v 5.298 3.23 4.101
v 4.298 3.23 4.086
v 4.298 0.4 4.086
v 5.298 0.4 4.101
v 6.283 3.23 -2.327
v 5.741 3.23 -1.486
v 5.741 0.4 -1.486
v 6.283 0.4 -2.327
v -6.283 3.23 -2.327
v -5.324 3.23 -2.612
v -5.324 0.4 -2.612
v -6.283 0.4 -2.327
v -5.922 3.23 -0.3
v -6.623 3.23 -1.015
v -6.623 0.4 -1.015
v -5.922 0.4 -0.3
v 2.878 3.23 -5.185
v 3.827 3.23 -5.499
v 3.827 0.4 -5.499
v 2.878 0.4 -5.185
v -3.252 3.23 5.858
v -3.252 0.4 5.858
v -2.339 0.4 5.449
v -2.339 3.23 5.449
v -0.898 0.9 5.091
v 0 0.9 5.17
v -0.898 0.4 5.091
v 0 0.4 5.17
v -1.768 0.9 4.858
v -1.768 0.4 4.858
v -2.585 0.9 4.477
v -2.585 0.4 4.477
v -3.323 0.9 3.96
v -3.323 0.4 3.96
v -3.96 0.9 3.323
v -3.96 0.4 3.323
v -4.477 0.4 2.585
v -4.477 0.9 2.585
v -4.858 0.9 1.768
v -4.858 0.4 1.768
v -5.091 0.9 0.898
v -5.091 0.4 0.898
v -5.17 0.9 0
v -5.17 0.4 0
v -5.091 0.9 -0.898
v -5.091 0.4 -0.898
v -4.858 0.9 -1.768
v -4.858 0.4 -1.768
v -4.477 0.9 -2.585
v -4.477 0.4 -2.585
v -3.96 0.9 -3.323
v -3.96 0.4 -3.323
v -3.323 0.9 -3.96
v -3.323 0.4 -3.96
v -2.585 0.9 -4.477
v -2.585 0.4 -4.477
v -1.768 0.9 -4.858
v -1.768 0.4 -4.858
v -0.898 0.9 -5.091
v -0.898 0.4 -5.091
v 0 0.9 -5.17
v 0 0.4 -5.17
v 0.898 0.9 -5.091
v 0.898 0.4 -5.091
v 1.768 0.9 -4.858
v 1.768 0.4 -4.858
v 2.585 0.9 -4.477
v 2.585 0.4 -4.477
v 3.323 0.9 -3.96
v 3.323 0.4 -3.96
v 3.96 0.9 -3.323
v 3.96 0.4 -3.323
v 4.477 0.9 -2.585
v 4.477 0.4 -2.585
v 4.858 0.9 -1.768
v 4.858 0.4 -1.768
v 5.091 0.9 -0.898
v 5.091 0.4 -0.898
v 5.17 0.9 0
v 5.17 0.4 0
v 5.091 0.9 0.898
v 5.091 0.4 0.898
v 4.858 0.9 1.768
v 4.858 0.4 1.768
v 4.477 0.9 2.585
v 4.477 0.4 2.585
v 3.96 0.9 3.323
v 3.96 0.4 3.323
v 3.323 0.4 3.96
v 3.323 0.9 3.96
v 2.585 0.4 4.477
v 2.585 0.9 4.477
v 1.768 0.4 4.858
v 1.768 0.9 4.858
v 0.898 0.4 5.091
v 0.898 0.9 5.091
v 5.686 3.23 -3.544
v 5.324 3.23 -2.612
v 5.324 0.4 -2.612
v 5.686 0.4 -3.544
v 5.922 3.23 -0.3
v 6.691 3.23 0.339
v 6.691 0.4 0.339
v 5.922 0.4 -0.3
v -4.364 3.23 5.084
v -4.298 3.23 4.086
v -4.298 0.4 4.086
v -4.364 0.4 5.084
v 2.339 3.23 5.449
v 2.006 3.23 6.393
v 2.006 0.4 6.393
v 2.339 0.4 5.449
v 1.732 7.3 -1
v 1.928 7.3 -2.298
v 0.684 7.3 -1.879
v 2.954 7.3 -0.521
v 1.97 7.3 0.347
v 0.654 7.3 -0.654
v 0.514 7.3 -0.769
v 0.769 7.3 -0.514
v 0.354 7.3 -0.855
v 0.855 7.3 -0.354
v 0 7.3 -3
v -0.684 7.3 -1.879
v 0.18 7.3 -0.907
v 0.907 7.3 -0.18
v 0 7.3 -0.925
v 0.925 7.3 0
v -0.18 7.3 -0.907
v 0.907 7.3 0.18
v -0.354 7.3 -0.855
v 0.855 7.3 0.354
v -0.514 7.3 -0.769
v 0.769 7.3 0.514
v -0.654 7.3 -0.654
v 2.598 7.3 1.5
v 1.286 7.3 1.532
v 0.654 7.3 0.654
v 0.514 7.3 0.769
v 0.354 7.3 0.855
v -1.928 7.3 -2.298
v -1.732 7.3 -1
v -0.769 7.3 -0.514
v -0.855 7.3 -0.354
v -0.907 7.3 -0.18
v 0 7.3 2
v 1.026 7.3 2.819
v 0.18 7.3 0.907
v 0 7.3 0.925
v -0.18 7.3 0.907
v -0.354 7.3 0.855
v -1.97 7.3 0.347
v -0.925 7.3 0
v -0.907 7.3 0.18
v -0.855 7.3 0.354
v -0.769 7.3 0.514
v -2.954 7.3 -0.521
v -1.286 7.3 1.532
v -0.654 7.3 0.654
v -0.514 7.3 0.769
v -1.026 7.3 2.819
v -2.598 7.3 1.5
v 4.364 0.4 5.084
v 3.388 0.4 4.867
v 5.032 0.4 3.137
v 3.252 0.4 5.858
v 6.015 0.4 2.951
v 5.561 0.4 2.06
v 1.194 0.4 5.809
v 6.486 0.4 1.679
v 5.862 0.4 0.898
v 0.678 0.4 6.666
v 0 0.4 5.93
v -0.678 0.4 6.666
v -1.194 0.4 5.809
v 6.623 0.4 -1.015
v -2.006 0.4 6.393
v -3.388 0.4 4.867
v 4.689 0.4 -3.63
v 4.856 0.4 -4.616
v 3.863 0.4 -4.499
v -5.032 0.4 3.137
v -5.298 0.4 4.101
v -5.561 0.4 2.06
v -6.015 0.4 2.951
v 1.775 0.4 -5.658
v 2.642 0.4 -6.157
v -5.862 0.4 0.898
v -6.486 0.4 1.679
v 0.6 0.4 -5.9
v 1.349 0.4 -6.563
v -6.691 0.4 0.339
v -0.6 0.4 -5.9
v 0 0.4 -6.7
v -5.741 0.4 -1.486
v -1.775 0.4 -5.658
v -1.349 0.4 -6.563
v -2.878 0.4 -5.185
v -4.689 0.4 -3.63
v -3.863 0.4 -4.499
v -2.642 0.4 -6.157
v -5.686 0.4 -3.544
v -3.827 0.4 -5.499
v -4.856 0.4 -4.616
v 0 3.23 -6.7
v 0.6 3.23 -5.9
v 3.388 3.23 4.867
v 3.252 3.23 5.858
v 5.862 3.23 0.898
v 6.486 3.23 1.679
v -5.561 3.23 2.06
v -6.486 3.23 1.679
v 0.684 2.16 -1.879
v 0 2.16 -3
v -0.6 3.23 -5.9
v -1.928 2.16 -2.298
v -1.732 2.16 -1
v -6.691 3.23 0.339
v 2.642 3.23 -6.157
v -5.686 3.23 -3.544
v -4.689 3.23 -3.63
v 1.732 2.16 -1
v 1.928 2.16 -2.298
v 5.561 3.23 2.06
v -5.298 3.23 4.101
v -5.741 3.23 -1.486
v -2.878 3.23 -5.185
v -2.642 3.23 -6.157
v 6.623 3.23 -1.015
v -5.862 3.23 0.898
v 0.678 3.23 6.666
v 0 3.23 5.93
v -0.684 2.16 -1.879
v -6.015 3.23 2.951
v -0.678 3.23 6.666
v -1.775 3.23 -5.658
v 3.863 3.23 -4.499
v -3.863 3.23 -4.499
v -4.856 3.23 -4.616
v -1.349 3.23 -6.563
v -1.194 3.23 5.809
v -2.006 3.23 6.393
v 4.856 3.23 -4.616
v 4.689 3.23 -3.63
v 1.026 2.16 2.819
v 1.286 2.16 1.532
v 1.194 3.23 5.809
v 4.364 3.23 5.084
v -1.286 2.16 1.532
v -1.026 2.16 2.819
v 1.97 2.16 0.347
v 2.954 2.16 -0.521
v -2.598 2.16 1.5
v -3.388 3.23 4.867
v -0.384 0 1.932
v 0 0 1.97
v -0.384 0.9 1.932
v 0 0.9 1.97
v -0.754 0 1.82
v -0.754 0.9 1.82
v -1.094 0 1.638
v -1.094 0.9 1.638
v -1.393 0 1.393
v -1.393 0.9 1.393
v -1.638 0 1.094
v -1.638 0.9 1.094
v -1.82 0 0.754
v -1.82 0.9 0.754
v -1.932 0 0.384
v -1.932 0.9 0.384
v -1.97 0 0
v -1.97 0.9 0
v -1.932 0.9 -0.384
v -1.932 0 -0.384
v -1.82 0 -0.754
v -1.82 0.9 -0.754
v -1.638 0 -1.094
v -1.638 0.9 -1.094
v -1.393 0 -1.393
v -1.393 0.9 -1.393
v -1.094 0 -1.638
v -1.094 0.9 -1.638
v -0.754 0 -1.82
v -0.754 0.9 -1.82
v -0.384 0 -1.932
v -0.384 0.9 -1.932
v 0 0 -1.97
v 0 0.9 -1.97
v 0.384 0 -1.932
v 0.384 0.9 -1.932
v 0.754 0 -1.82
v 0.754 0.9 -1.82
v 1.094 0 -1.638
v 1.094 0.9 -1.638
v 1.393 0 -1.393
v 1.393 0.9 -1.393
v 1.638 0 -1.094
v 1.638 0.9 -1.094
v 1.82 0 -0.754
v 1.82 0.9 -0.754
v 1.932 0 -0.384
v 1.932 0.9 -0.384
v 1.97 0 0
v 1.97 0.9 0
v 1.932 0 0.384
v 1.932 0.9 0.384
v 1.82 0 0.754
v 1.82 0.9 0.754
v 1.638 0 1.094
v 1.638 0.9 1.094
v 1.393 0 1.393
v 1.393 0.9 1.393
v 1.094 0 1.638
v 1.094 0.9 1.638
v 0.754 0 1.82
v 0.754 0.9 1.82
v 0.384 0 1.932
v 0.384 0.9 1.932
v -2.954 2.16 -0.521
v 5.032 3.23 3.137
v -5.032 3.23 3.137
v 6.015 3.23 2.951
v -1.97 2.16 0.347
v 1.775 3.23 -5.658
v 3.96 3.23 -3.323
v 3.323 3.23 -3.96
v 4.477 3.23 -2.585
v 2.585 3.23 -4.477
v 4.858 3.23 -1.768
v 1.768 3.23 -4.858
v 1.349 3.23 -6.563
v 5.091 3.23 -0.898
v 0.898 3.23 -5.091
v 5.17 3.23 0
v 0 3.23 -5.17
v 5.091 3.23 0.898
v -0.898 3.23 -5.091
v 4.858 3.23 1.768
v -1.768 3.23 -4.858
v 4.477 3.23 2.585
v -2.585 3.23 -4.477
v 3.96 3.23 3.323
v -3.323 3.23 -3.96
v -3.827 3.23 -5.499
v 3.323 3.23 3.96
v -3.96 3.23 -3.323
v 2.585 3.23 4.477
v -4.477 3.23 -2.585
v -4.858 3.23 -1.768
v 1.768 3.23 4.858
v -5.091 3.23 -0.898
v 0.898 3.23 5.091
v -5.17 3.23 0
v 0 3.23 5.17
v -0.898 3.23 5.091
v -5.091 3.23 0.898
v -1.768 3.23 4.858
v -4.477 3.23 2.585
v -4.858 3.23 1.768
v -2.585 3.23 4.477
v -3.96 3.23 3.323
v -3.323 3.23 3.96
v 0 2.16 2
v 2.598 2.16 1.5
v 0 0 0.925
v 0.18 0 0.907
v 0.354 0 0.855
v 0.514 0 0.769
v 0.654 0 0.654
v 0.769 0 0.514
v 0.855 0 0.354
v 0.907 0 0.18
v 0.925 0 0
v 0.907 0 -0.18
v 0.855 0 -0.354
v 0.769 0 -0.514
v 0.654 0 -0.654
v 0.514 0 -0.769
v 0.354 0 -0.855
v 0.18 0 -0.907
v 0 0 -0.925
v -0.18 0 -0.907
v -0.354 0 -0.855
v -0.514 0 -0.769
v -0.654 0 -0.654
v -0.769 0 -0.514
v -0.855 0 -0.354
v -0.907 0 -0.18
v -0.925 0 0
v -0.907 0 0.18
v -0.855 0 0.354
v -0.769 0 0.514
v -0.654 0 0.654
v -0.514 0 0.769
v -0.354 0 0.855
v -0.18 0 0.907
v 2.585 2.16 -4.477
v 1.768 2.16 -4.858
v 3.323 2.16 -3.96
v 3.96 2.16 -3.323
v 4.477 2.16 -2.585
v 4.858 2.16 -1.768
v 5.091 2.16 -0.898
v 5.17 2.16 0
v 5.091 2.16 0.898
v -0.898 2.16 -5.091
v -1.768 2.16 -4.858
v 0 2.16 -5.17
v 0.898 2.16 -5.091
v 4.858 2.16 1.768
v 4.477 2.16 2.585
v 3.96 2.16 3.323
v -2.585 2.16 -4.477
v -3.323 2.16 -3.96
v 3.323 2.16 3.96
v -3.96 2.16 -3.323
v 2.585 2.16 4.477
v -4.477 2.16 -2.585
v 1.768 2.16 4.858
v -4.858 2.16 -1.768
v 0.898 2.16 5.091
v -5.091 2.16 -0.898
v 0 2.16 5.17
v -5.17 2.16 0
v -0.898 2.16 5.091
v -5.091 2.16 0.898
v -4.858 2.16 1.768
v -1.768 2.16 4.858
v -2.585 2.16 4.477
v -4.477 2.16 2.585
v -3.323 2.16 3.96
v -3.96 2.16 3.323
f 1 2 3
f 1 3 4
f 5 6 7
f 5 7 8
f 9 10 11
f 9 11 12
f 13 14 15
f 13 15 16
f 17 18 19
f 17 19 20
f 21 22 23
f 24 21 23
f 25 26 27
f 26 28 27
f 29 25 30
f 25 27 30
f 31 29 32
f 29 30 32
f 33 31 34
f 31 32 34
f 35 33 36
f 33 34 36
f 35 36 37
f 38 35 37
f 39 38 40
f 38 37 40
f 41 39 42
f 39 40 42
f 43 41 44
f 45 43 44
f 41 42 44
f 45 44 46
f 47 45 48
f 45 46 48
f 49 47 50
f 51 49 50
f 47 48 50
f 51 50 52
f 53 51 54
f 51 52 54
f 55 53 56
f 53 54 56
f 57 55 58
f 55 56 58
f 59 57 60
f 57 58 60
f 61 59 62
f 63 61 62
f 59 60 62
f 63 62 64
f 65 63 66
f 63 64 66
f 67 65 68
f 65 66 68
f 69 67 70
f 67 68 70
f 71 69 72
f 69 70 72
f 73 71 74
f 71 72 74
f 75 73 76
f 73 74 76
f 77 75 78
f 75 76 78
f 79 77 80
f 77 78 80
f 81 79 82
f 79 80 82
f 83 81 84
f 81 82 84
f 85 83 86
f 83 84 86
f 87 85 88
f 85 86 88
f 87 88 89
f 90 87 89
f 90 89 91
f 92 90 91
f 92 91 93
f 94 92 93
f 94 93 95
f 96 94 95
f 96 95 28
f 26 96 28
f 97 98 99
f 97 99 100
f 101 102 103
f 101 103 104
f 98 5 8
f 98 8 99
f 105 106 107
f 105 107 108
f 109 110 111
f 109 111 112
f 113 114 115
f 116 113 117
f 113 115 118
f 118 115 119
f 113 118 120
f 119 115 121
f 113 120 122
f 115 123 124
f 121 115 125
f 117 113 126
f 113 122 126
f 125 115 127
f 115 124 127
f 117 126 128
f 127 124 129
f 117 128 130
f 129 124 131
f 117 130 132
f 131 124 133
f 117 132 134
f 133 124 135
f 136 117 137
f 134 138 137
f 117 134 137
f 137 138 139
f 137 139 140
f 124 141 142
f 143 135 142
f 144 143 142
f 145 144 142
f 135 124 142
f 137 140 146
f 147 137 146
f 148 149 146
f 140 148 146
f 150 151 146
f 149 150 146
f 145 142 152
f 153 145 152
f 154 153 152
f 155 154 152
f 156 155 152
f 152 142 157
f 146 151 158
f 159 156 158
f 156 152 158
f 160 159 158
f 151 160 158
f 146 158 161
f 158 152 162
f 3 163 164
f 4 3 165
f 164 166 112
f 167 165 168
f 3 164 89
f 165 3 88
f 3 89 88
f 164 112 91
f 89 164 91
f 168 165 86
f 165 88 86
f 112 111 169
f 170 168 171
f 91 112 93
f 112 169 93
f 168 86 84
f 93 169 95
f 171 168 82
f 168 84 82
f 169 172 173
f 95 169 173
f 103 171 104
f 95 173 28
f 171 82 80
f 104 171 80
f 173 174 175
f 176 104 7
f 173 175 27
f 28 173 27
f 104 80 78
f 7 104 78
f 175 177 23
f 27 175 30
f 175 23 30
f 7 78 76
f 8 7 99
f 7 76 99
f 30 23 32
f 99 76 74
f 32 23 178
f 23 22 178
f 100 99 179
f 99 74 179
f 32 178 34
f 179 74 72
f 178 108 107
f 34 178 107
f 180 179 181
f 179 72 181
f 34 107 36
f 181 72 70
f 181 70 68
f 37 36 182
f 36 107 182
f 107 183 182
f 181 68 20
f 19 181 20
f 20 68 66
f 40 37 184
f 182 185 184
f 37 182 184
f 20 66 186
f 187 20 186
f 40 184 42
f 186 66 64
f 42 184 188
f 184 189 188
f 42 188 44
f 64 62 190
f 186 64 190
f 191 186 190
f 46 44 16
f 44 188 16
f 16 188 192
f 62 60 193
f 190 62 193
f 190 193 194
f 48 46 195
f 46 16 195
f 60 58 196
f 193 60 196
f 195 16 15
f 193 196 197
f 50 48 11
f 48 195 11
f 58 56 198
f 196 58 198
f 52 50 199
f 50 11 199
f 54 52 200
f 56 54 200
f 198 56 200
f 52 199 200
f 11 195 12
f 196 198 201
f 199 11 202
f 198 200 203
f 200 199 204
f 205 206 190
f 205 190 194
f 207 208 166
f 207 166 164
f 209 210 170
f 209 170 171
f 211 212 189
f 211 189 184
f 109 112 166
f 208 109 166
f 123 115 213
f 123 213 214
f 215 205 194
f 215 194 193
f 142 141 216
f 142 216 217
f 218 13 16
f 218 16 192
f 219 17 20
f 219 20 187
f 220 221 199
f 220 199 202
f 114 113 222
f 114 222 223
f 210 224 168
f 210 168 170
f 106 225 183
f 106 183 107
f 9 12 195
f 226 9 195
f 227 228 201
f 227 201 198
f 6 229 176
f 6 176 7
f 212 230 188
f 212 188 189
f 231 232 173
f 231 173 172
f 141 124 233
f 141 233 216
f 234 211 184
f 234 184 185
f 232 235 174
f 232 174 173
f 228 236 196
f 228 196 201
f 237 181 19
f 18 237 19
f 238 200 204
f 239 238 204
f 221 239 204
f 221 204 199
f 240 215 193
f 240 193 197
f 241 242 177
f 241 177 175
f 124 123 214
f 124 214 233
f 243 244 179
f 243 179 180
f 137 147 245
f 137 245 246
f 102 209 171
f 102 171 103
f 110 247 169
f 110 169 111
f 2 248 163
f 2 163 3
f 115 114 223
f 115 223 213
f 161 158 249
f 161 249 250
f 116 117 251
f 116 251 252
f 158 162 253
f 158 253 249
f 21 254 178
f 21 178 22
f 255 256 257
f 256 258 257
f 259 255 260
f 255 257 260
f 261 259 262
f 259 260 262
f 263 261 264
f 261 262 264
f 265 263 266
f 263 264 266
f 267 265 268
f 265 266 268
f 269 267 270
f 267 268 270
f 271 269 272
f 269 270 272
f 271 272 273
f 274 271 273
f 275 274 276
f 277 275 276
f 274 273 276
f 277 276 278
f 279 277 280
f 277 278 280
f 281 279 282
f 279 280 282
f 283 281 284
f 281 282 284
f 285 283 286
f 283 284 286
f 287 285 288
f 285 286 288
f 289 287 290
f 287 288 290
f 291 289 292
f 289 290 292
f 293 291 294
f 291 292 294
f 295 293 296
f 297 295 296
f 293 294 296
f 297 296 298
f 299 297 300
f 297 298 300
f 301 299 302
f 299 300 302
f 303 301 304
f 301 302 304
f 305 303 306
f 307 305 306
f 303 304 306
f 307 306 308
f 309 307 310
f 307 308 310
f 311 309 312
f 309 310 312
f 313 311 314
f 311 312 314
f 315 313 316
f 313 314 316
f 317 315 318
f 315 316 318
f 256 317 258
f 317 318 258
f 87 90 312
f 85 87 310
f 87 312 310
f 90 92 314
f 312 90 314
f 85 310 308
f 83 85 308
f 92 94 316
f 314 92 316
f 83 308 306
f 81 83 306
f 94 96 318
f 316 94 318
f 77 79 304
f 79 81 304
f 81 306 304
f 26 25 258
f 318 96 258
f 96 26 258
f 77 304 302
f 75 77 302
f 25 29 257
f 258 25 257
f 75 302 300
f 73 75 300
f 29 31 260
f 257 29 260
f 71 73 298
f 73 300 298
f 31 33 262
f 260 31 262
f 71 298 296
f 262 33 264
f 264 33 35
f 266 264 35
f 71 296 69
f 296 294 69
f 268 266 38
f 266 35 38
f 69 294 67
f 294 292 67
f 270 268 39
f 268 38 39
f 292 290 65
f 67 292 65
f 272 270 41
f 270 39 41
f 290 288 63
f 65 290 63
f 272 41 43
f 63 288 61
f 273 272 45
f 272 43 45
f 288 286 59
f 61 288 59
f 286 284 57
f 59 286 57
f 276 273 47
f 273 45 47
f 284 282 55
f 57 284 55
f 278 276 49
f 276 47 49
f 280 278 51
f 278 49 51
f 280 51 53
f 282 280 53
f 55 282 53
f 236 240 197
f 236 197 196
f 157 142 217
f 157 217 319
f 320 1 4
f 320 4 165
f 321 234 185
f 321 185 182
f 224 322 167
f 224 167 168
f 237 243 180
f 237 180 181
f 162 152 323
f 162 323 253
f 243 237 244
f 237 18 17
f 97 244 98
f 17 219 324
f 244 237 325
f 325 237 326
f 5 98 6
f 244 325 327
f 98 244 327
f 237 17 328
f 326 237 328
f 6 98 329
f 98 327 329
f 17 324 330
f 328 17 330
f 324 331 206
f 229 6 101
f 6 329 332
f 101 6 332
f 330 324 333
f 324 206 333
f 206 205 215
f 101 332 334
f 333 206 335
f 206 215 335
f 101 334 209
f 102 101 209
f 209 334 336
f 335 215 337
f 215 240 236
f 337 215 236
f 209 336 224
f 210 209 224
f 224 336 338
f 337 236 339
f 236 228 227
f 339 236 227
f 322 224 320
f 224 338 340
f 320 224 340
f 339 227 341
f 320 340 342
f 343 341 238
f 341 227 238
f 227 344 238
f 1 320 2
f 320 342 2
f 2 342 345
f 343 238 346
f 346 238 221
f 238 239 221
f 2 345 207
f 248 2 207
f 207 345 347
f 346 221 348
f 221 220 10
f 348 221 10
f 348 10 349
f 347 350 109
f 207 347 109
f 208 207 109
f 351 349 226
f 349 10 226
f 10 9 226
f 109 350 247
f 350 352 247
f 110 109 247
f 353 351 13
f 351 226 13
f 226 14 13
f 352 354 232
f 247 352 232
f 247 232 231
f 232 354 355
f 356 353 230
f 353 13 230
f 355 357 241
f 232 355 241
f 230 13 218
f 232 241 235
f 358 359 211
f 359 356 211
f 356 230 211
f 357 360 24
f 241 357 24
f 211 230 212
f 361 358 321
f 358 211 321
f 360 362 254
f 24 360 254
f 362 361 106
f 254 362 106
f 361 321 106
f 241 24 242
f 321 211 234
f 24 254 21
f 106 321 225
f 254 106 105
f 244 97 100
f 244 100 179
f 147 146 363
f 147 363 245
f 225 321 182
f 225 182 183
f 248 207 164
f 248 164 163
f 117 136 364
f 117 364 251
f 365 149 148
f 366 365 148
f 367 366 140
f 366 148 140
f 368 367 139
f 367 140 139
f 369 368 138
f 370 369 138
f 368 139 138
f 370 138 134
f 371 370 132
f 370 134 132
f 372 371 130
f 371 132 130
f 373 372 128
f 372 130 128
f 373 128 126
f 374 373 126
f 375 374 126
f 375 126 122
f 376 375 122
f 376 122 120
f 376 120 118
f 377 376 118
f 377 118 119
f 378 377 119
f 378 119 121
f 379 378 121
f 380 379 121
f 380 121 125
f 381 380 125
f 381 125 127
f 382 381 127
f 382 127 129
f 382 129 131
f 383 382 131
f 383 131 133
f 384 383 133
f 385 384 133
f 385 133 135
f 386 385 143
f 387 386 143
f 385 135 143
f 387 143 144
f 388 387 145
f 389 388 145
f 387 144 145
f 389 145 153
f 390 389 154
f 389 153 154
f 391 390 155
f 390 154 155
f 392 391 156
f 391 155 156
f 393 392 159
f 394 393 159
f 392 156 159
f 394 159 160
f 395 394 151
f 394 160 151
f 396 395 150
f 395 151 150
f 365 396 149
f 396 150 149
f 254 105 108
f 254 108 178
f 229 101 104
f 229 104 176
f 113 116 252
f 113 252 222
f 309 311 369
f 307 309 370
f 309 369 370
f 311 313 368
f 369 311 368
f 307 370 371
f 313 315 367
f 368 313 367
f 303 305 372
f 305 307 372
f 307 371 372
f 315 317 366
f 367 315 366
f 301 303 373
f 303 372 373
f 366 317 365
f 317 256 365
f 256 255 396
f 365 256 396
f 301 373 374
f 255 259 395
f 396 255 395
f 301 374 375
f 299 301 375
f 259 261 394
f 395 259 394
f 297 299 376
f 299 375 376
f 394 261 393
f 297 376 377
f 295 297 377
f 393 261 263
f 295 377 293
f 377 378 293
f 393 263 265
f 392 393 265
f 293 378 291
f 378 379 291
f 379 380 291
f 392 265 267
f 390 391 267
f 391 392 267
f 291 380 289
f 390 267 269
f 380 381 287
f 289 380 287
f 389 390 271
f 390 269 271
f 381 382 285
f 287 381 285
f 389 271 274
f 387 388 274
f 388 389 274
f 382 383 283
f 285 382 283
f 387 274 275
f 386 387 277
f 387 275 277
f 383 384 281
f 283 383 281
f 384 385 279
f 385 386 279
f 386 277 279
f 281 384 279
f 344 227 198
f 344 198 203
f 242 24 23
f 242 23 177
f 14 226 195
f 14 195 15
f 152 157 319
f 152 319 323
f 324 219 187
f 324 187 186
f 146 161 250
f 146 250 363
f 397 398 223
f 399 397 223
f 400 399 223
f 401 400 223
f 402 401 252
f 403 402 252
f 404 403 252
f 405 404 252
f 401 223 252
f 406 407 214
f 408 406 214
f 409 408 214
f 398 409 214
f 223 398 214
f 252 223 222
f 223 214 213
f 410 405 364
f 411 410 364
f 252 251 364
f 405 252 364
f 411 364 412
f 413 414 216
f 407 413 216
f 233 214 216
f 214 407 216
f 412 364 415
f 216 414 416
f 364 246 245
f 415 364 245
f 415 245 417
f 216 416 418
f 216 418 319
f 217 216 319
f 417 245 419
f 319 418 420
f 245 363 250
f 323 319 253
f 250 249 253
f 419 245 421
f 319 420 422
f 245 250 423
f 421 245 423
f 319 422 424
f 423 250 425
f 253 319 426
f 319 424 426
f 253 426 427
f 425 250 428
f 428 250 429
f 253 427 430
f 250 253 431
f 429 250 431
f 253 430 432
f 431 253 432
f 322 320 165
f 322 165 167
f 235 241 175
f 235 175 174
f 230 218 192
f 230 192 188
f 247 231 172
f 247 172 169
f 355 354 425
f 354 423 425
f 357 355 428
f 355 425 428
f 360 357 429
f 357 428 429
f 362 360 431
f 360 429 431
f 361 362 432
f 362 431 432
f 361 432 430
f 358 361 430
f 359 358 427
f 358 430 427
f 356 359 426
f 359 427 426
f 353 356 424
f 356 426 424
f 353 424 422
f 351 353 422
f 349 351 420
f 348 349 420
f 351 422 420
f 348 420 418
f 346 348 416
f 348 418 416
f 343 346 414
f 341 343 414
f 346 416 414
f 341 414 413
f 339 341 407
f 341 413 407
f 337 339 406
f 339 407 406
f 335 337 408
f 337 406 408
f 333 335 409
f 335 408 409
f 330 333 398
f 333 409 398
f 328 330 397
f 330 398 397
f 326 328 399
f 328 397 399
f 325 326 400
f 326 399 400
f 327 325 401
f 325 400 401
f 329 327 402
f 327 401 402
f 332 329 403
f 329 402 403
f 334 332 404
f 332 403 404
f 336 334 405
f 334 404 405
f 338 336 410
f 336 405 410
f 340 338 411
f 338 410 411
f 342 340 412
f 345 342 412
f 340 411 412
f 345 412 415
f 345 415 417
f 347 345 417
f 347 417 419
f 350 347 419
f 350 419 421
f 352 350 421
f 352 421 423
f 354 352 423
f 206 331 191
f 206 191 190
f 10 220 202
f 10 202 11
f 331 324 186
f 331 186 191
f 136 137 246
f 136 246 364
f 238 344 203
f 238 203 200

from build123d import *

# Parameters (mm, degrees)
SKETCH3_R          = 7.2
CUT_EXTRUDE1_DEPTH = 11.312366363
SKETCH4_R          = 3.5
CUT_EXTRUDE2_DEPTH = 5.14
SKETCH5_R          = 0.925
CUT_EXTRUDE3_DEPTH = 12.956372442


with BuildPart() as part:
    # Sketch1 → Revolve1 (revolve)
    with BuildSketch(Plane.XY, mode=Mode.PRIVATE) as revolve1_sk:
        Polygon((0, 7.3), (0, 0), (1.97, 0), (1.97, 0.9), (5.17, 0.9), (5.17, 0.4), (6.7, 0.4), (6.7, 3.23), (5.17, 3.23), (5.17, 2.16), (3, 2.16), (3, 7.3), align=None)
    revolve(revolve1_sk.sketch.rotate(Axis((0, 7.3, 0), (0, -1, 0)), 90), axis=Axis((0, 7.3, 0), (0, -1, 0)))

    # Sketch3 → Cut-Extrude1 (cut, through all)
    with BuildSketch(Plane(origin=(0, 3.23, 0), x_dir=(1, 0, 0), z_dir=(0, 1, 0))):
        Circle(SKETCH3_R)
        Polygon((0, 6.7), (-0.599928149, 5.899575088), (-1.348700085, 6.562850606), (-1.775223319, 5.65804579), (-2.642184229, 6.157017338), (-2.877840638, 5.184875434), (-3.827497041, 5.499115056), (-3.862638823, 4.499435668), (-4.856111674, 4.616078358), (-4.68930012, 3.629788477), (-5.685916525, 3.544058869), (-5.32398092, 2.611537319), (-6.282939285, 2.326945194), (-5.740697315, 1.486369516), (-6.622737773, 1.014566109), (-5.922388888, 0.300349571), (-6.691400598, -0.339349431), (-5.861617163, -0.897966721), (-6.486116696, -1.679371966), (-5.560870144, -2.059520149), (-6.015290415, -2.950640815), (-5.032460447, -3.136756581), (-5.298197437, -4.101110083), (-4.298021228, -4.08557383), (-4.364195634, -5.083679422), (-3.387620516, -4.867127206), (-3.251523149, -5.858122328), (-2.338530221, -5.449419823), (-2.005732924, -6.392733018), (-1.193700224, -5.808612552), (-0.677827757, -6.665624467), (0, -5.93), (0.677827757, -6.665624467), (1.193700224, -5.808612552), (2.005732924, -6.392733018), (2.338530221, -5.449419823), (3.251523149, -5.858122328), (3.387620516, -4.867127206), (4.364195634, -5.083679422), (4.298021228, -4.08557383), (5.298197437, -4.101110083), (5.032460447, -3.136756581), (6.015290415, -2.950640815), (5.560870144, -2.059520149), (6.486116696, -1.679371966), (5.861617163, -0.897966721), (6.691400598, -0.339349431), (5.922388888, 0.300349571), (6.622737773, 1.014566109), (5.740697315, 1.486369516), (6.282939285, 2.326945194), (5.32398092, 2.611537319), (5.685916525, 3.544058869), (4.68930012, 3.629788477), (4.856111674, 4.616078358), (3.862638823, 4.499435668), (3.827497041, 5.499115056), (2.877840638, 5.184875434), (2.642184229, 6.157017338), (1.775223319, 5.65804579), (1.348700085, 6.562850606), (0.599928149, 5.899575088), align=None, mode=Mode.SUBTRACT)
    extrude(amount=-CUT_EXTRUDE1_DEPTH, mode=Mode.SUBTRACT)

    # Sketch4 → Cut-Extrude2 (cut)
    with BuildSketch(Plane(origin=(0, 7.3, 0), x_dir=(1, 0, 0), z_dir=(0, 1, 0))):
        Circle(SKETCH4_R)
        Polygon((0, 3), (-0.684040287, 1.879385242), (-1.928362829, 2.298133329), (-1.732050808, 1), (-2.954423259, 0.520944533), (-1.969615506, -0.347296355), (-2.598076211, -1.5), (-1.285575219, -1.532088886), (-1.02606043, -2.819077862), (0, -2), (1.02606043, -2.819077862), (1.285575219, -1.532088886), (2.598076211, -1.5), (1.969615506, -0.347296355), (2.954423259, 0.520944533), (1.732050808, 1), (1.928362829, 2.298133329), (0.684040287, 1.879385242), align=None, mode=Mode.SUBTRACT)
    extrude(amount=-CUT_EXTRUDE2_DEPTH, mode=Mode.SUBTRACT)

    # Sketch5 → Cut-Extrude3 (cut, through all)
    with BuildSketch(Plane(origin=(0, 7.3, 0), x_dir=(1, 0, 0), z_dir=(0, 1, 0))):
        with Locations(Location((0, 0, 0), (0, 0, 270))):
            Circle(SKETCH5_R)
    extrude(amount=-CUT_EXTRUDE3_DEPTH, mode=Mode.SUBTRACT)


solid = part.part
